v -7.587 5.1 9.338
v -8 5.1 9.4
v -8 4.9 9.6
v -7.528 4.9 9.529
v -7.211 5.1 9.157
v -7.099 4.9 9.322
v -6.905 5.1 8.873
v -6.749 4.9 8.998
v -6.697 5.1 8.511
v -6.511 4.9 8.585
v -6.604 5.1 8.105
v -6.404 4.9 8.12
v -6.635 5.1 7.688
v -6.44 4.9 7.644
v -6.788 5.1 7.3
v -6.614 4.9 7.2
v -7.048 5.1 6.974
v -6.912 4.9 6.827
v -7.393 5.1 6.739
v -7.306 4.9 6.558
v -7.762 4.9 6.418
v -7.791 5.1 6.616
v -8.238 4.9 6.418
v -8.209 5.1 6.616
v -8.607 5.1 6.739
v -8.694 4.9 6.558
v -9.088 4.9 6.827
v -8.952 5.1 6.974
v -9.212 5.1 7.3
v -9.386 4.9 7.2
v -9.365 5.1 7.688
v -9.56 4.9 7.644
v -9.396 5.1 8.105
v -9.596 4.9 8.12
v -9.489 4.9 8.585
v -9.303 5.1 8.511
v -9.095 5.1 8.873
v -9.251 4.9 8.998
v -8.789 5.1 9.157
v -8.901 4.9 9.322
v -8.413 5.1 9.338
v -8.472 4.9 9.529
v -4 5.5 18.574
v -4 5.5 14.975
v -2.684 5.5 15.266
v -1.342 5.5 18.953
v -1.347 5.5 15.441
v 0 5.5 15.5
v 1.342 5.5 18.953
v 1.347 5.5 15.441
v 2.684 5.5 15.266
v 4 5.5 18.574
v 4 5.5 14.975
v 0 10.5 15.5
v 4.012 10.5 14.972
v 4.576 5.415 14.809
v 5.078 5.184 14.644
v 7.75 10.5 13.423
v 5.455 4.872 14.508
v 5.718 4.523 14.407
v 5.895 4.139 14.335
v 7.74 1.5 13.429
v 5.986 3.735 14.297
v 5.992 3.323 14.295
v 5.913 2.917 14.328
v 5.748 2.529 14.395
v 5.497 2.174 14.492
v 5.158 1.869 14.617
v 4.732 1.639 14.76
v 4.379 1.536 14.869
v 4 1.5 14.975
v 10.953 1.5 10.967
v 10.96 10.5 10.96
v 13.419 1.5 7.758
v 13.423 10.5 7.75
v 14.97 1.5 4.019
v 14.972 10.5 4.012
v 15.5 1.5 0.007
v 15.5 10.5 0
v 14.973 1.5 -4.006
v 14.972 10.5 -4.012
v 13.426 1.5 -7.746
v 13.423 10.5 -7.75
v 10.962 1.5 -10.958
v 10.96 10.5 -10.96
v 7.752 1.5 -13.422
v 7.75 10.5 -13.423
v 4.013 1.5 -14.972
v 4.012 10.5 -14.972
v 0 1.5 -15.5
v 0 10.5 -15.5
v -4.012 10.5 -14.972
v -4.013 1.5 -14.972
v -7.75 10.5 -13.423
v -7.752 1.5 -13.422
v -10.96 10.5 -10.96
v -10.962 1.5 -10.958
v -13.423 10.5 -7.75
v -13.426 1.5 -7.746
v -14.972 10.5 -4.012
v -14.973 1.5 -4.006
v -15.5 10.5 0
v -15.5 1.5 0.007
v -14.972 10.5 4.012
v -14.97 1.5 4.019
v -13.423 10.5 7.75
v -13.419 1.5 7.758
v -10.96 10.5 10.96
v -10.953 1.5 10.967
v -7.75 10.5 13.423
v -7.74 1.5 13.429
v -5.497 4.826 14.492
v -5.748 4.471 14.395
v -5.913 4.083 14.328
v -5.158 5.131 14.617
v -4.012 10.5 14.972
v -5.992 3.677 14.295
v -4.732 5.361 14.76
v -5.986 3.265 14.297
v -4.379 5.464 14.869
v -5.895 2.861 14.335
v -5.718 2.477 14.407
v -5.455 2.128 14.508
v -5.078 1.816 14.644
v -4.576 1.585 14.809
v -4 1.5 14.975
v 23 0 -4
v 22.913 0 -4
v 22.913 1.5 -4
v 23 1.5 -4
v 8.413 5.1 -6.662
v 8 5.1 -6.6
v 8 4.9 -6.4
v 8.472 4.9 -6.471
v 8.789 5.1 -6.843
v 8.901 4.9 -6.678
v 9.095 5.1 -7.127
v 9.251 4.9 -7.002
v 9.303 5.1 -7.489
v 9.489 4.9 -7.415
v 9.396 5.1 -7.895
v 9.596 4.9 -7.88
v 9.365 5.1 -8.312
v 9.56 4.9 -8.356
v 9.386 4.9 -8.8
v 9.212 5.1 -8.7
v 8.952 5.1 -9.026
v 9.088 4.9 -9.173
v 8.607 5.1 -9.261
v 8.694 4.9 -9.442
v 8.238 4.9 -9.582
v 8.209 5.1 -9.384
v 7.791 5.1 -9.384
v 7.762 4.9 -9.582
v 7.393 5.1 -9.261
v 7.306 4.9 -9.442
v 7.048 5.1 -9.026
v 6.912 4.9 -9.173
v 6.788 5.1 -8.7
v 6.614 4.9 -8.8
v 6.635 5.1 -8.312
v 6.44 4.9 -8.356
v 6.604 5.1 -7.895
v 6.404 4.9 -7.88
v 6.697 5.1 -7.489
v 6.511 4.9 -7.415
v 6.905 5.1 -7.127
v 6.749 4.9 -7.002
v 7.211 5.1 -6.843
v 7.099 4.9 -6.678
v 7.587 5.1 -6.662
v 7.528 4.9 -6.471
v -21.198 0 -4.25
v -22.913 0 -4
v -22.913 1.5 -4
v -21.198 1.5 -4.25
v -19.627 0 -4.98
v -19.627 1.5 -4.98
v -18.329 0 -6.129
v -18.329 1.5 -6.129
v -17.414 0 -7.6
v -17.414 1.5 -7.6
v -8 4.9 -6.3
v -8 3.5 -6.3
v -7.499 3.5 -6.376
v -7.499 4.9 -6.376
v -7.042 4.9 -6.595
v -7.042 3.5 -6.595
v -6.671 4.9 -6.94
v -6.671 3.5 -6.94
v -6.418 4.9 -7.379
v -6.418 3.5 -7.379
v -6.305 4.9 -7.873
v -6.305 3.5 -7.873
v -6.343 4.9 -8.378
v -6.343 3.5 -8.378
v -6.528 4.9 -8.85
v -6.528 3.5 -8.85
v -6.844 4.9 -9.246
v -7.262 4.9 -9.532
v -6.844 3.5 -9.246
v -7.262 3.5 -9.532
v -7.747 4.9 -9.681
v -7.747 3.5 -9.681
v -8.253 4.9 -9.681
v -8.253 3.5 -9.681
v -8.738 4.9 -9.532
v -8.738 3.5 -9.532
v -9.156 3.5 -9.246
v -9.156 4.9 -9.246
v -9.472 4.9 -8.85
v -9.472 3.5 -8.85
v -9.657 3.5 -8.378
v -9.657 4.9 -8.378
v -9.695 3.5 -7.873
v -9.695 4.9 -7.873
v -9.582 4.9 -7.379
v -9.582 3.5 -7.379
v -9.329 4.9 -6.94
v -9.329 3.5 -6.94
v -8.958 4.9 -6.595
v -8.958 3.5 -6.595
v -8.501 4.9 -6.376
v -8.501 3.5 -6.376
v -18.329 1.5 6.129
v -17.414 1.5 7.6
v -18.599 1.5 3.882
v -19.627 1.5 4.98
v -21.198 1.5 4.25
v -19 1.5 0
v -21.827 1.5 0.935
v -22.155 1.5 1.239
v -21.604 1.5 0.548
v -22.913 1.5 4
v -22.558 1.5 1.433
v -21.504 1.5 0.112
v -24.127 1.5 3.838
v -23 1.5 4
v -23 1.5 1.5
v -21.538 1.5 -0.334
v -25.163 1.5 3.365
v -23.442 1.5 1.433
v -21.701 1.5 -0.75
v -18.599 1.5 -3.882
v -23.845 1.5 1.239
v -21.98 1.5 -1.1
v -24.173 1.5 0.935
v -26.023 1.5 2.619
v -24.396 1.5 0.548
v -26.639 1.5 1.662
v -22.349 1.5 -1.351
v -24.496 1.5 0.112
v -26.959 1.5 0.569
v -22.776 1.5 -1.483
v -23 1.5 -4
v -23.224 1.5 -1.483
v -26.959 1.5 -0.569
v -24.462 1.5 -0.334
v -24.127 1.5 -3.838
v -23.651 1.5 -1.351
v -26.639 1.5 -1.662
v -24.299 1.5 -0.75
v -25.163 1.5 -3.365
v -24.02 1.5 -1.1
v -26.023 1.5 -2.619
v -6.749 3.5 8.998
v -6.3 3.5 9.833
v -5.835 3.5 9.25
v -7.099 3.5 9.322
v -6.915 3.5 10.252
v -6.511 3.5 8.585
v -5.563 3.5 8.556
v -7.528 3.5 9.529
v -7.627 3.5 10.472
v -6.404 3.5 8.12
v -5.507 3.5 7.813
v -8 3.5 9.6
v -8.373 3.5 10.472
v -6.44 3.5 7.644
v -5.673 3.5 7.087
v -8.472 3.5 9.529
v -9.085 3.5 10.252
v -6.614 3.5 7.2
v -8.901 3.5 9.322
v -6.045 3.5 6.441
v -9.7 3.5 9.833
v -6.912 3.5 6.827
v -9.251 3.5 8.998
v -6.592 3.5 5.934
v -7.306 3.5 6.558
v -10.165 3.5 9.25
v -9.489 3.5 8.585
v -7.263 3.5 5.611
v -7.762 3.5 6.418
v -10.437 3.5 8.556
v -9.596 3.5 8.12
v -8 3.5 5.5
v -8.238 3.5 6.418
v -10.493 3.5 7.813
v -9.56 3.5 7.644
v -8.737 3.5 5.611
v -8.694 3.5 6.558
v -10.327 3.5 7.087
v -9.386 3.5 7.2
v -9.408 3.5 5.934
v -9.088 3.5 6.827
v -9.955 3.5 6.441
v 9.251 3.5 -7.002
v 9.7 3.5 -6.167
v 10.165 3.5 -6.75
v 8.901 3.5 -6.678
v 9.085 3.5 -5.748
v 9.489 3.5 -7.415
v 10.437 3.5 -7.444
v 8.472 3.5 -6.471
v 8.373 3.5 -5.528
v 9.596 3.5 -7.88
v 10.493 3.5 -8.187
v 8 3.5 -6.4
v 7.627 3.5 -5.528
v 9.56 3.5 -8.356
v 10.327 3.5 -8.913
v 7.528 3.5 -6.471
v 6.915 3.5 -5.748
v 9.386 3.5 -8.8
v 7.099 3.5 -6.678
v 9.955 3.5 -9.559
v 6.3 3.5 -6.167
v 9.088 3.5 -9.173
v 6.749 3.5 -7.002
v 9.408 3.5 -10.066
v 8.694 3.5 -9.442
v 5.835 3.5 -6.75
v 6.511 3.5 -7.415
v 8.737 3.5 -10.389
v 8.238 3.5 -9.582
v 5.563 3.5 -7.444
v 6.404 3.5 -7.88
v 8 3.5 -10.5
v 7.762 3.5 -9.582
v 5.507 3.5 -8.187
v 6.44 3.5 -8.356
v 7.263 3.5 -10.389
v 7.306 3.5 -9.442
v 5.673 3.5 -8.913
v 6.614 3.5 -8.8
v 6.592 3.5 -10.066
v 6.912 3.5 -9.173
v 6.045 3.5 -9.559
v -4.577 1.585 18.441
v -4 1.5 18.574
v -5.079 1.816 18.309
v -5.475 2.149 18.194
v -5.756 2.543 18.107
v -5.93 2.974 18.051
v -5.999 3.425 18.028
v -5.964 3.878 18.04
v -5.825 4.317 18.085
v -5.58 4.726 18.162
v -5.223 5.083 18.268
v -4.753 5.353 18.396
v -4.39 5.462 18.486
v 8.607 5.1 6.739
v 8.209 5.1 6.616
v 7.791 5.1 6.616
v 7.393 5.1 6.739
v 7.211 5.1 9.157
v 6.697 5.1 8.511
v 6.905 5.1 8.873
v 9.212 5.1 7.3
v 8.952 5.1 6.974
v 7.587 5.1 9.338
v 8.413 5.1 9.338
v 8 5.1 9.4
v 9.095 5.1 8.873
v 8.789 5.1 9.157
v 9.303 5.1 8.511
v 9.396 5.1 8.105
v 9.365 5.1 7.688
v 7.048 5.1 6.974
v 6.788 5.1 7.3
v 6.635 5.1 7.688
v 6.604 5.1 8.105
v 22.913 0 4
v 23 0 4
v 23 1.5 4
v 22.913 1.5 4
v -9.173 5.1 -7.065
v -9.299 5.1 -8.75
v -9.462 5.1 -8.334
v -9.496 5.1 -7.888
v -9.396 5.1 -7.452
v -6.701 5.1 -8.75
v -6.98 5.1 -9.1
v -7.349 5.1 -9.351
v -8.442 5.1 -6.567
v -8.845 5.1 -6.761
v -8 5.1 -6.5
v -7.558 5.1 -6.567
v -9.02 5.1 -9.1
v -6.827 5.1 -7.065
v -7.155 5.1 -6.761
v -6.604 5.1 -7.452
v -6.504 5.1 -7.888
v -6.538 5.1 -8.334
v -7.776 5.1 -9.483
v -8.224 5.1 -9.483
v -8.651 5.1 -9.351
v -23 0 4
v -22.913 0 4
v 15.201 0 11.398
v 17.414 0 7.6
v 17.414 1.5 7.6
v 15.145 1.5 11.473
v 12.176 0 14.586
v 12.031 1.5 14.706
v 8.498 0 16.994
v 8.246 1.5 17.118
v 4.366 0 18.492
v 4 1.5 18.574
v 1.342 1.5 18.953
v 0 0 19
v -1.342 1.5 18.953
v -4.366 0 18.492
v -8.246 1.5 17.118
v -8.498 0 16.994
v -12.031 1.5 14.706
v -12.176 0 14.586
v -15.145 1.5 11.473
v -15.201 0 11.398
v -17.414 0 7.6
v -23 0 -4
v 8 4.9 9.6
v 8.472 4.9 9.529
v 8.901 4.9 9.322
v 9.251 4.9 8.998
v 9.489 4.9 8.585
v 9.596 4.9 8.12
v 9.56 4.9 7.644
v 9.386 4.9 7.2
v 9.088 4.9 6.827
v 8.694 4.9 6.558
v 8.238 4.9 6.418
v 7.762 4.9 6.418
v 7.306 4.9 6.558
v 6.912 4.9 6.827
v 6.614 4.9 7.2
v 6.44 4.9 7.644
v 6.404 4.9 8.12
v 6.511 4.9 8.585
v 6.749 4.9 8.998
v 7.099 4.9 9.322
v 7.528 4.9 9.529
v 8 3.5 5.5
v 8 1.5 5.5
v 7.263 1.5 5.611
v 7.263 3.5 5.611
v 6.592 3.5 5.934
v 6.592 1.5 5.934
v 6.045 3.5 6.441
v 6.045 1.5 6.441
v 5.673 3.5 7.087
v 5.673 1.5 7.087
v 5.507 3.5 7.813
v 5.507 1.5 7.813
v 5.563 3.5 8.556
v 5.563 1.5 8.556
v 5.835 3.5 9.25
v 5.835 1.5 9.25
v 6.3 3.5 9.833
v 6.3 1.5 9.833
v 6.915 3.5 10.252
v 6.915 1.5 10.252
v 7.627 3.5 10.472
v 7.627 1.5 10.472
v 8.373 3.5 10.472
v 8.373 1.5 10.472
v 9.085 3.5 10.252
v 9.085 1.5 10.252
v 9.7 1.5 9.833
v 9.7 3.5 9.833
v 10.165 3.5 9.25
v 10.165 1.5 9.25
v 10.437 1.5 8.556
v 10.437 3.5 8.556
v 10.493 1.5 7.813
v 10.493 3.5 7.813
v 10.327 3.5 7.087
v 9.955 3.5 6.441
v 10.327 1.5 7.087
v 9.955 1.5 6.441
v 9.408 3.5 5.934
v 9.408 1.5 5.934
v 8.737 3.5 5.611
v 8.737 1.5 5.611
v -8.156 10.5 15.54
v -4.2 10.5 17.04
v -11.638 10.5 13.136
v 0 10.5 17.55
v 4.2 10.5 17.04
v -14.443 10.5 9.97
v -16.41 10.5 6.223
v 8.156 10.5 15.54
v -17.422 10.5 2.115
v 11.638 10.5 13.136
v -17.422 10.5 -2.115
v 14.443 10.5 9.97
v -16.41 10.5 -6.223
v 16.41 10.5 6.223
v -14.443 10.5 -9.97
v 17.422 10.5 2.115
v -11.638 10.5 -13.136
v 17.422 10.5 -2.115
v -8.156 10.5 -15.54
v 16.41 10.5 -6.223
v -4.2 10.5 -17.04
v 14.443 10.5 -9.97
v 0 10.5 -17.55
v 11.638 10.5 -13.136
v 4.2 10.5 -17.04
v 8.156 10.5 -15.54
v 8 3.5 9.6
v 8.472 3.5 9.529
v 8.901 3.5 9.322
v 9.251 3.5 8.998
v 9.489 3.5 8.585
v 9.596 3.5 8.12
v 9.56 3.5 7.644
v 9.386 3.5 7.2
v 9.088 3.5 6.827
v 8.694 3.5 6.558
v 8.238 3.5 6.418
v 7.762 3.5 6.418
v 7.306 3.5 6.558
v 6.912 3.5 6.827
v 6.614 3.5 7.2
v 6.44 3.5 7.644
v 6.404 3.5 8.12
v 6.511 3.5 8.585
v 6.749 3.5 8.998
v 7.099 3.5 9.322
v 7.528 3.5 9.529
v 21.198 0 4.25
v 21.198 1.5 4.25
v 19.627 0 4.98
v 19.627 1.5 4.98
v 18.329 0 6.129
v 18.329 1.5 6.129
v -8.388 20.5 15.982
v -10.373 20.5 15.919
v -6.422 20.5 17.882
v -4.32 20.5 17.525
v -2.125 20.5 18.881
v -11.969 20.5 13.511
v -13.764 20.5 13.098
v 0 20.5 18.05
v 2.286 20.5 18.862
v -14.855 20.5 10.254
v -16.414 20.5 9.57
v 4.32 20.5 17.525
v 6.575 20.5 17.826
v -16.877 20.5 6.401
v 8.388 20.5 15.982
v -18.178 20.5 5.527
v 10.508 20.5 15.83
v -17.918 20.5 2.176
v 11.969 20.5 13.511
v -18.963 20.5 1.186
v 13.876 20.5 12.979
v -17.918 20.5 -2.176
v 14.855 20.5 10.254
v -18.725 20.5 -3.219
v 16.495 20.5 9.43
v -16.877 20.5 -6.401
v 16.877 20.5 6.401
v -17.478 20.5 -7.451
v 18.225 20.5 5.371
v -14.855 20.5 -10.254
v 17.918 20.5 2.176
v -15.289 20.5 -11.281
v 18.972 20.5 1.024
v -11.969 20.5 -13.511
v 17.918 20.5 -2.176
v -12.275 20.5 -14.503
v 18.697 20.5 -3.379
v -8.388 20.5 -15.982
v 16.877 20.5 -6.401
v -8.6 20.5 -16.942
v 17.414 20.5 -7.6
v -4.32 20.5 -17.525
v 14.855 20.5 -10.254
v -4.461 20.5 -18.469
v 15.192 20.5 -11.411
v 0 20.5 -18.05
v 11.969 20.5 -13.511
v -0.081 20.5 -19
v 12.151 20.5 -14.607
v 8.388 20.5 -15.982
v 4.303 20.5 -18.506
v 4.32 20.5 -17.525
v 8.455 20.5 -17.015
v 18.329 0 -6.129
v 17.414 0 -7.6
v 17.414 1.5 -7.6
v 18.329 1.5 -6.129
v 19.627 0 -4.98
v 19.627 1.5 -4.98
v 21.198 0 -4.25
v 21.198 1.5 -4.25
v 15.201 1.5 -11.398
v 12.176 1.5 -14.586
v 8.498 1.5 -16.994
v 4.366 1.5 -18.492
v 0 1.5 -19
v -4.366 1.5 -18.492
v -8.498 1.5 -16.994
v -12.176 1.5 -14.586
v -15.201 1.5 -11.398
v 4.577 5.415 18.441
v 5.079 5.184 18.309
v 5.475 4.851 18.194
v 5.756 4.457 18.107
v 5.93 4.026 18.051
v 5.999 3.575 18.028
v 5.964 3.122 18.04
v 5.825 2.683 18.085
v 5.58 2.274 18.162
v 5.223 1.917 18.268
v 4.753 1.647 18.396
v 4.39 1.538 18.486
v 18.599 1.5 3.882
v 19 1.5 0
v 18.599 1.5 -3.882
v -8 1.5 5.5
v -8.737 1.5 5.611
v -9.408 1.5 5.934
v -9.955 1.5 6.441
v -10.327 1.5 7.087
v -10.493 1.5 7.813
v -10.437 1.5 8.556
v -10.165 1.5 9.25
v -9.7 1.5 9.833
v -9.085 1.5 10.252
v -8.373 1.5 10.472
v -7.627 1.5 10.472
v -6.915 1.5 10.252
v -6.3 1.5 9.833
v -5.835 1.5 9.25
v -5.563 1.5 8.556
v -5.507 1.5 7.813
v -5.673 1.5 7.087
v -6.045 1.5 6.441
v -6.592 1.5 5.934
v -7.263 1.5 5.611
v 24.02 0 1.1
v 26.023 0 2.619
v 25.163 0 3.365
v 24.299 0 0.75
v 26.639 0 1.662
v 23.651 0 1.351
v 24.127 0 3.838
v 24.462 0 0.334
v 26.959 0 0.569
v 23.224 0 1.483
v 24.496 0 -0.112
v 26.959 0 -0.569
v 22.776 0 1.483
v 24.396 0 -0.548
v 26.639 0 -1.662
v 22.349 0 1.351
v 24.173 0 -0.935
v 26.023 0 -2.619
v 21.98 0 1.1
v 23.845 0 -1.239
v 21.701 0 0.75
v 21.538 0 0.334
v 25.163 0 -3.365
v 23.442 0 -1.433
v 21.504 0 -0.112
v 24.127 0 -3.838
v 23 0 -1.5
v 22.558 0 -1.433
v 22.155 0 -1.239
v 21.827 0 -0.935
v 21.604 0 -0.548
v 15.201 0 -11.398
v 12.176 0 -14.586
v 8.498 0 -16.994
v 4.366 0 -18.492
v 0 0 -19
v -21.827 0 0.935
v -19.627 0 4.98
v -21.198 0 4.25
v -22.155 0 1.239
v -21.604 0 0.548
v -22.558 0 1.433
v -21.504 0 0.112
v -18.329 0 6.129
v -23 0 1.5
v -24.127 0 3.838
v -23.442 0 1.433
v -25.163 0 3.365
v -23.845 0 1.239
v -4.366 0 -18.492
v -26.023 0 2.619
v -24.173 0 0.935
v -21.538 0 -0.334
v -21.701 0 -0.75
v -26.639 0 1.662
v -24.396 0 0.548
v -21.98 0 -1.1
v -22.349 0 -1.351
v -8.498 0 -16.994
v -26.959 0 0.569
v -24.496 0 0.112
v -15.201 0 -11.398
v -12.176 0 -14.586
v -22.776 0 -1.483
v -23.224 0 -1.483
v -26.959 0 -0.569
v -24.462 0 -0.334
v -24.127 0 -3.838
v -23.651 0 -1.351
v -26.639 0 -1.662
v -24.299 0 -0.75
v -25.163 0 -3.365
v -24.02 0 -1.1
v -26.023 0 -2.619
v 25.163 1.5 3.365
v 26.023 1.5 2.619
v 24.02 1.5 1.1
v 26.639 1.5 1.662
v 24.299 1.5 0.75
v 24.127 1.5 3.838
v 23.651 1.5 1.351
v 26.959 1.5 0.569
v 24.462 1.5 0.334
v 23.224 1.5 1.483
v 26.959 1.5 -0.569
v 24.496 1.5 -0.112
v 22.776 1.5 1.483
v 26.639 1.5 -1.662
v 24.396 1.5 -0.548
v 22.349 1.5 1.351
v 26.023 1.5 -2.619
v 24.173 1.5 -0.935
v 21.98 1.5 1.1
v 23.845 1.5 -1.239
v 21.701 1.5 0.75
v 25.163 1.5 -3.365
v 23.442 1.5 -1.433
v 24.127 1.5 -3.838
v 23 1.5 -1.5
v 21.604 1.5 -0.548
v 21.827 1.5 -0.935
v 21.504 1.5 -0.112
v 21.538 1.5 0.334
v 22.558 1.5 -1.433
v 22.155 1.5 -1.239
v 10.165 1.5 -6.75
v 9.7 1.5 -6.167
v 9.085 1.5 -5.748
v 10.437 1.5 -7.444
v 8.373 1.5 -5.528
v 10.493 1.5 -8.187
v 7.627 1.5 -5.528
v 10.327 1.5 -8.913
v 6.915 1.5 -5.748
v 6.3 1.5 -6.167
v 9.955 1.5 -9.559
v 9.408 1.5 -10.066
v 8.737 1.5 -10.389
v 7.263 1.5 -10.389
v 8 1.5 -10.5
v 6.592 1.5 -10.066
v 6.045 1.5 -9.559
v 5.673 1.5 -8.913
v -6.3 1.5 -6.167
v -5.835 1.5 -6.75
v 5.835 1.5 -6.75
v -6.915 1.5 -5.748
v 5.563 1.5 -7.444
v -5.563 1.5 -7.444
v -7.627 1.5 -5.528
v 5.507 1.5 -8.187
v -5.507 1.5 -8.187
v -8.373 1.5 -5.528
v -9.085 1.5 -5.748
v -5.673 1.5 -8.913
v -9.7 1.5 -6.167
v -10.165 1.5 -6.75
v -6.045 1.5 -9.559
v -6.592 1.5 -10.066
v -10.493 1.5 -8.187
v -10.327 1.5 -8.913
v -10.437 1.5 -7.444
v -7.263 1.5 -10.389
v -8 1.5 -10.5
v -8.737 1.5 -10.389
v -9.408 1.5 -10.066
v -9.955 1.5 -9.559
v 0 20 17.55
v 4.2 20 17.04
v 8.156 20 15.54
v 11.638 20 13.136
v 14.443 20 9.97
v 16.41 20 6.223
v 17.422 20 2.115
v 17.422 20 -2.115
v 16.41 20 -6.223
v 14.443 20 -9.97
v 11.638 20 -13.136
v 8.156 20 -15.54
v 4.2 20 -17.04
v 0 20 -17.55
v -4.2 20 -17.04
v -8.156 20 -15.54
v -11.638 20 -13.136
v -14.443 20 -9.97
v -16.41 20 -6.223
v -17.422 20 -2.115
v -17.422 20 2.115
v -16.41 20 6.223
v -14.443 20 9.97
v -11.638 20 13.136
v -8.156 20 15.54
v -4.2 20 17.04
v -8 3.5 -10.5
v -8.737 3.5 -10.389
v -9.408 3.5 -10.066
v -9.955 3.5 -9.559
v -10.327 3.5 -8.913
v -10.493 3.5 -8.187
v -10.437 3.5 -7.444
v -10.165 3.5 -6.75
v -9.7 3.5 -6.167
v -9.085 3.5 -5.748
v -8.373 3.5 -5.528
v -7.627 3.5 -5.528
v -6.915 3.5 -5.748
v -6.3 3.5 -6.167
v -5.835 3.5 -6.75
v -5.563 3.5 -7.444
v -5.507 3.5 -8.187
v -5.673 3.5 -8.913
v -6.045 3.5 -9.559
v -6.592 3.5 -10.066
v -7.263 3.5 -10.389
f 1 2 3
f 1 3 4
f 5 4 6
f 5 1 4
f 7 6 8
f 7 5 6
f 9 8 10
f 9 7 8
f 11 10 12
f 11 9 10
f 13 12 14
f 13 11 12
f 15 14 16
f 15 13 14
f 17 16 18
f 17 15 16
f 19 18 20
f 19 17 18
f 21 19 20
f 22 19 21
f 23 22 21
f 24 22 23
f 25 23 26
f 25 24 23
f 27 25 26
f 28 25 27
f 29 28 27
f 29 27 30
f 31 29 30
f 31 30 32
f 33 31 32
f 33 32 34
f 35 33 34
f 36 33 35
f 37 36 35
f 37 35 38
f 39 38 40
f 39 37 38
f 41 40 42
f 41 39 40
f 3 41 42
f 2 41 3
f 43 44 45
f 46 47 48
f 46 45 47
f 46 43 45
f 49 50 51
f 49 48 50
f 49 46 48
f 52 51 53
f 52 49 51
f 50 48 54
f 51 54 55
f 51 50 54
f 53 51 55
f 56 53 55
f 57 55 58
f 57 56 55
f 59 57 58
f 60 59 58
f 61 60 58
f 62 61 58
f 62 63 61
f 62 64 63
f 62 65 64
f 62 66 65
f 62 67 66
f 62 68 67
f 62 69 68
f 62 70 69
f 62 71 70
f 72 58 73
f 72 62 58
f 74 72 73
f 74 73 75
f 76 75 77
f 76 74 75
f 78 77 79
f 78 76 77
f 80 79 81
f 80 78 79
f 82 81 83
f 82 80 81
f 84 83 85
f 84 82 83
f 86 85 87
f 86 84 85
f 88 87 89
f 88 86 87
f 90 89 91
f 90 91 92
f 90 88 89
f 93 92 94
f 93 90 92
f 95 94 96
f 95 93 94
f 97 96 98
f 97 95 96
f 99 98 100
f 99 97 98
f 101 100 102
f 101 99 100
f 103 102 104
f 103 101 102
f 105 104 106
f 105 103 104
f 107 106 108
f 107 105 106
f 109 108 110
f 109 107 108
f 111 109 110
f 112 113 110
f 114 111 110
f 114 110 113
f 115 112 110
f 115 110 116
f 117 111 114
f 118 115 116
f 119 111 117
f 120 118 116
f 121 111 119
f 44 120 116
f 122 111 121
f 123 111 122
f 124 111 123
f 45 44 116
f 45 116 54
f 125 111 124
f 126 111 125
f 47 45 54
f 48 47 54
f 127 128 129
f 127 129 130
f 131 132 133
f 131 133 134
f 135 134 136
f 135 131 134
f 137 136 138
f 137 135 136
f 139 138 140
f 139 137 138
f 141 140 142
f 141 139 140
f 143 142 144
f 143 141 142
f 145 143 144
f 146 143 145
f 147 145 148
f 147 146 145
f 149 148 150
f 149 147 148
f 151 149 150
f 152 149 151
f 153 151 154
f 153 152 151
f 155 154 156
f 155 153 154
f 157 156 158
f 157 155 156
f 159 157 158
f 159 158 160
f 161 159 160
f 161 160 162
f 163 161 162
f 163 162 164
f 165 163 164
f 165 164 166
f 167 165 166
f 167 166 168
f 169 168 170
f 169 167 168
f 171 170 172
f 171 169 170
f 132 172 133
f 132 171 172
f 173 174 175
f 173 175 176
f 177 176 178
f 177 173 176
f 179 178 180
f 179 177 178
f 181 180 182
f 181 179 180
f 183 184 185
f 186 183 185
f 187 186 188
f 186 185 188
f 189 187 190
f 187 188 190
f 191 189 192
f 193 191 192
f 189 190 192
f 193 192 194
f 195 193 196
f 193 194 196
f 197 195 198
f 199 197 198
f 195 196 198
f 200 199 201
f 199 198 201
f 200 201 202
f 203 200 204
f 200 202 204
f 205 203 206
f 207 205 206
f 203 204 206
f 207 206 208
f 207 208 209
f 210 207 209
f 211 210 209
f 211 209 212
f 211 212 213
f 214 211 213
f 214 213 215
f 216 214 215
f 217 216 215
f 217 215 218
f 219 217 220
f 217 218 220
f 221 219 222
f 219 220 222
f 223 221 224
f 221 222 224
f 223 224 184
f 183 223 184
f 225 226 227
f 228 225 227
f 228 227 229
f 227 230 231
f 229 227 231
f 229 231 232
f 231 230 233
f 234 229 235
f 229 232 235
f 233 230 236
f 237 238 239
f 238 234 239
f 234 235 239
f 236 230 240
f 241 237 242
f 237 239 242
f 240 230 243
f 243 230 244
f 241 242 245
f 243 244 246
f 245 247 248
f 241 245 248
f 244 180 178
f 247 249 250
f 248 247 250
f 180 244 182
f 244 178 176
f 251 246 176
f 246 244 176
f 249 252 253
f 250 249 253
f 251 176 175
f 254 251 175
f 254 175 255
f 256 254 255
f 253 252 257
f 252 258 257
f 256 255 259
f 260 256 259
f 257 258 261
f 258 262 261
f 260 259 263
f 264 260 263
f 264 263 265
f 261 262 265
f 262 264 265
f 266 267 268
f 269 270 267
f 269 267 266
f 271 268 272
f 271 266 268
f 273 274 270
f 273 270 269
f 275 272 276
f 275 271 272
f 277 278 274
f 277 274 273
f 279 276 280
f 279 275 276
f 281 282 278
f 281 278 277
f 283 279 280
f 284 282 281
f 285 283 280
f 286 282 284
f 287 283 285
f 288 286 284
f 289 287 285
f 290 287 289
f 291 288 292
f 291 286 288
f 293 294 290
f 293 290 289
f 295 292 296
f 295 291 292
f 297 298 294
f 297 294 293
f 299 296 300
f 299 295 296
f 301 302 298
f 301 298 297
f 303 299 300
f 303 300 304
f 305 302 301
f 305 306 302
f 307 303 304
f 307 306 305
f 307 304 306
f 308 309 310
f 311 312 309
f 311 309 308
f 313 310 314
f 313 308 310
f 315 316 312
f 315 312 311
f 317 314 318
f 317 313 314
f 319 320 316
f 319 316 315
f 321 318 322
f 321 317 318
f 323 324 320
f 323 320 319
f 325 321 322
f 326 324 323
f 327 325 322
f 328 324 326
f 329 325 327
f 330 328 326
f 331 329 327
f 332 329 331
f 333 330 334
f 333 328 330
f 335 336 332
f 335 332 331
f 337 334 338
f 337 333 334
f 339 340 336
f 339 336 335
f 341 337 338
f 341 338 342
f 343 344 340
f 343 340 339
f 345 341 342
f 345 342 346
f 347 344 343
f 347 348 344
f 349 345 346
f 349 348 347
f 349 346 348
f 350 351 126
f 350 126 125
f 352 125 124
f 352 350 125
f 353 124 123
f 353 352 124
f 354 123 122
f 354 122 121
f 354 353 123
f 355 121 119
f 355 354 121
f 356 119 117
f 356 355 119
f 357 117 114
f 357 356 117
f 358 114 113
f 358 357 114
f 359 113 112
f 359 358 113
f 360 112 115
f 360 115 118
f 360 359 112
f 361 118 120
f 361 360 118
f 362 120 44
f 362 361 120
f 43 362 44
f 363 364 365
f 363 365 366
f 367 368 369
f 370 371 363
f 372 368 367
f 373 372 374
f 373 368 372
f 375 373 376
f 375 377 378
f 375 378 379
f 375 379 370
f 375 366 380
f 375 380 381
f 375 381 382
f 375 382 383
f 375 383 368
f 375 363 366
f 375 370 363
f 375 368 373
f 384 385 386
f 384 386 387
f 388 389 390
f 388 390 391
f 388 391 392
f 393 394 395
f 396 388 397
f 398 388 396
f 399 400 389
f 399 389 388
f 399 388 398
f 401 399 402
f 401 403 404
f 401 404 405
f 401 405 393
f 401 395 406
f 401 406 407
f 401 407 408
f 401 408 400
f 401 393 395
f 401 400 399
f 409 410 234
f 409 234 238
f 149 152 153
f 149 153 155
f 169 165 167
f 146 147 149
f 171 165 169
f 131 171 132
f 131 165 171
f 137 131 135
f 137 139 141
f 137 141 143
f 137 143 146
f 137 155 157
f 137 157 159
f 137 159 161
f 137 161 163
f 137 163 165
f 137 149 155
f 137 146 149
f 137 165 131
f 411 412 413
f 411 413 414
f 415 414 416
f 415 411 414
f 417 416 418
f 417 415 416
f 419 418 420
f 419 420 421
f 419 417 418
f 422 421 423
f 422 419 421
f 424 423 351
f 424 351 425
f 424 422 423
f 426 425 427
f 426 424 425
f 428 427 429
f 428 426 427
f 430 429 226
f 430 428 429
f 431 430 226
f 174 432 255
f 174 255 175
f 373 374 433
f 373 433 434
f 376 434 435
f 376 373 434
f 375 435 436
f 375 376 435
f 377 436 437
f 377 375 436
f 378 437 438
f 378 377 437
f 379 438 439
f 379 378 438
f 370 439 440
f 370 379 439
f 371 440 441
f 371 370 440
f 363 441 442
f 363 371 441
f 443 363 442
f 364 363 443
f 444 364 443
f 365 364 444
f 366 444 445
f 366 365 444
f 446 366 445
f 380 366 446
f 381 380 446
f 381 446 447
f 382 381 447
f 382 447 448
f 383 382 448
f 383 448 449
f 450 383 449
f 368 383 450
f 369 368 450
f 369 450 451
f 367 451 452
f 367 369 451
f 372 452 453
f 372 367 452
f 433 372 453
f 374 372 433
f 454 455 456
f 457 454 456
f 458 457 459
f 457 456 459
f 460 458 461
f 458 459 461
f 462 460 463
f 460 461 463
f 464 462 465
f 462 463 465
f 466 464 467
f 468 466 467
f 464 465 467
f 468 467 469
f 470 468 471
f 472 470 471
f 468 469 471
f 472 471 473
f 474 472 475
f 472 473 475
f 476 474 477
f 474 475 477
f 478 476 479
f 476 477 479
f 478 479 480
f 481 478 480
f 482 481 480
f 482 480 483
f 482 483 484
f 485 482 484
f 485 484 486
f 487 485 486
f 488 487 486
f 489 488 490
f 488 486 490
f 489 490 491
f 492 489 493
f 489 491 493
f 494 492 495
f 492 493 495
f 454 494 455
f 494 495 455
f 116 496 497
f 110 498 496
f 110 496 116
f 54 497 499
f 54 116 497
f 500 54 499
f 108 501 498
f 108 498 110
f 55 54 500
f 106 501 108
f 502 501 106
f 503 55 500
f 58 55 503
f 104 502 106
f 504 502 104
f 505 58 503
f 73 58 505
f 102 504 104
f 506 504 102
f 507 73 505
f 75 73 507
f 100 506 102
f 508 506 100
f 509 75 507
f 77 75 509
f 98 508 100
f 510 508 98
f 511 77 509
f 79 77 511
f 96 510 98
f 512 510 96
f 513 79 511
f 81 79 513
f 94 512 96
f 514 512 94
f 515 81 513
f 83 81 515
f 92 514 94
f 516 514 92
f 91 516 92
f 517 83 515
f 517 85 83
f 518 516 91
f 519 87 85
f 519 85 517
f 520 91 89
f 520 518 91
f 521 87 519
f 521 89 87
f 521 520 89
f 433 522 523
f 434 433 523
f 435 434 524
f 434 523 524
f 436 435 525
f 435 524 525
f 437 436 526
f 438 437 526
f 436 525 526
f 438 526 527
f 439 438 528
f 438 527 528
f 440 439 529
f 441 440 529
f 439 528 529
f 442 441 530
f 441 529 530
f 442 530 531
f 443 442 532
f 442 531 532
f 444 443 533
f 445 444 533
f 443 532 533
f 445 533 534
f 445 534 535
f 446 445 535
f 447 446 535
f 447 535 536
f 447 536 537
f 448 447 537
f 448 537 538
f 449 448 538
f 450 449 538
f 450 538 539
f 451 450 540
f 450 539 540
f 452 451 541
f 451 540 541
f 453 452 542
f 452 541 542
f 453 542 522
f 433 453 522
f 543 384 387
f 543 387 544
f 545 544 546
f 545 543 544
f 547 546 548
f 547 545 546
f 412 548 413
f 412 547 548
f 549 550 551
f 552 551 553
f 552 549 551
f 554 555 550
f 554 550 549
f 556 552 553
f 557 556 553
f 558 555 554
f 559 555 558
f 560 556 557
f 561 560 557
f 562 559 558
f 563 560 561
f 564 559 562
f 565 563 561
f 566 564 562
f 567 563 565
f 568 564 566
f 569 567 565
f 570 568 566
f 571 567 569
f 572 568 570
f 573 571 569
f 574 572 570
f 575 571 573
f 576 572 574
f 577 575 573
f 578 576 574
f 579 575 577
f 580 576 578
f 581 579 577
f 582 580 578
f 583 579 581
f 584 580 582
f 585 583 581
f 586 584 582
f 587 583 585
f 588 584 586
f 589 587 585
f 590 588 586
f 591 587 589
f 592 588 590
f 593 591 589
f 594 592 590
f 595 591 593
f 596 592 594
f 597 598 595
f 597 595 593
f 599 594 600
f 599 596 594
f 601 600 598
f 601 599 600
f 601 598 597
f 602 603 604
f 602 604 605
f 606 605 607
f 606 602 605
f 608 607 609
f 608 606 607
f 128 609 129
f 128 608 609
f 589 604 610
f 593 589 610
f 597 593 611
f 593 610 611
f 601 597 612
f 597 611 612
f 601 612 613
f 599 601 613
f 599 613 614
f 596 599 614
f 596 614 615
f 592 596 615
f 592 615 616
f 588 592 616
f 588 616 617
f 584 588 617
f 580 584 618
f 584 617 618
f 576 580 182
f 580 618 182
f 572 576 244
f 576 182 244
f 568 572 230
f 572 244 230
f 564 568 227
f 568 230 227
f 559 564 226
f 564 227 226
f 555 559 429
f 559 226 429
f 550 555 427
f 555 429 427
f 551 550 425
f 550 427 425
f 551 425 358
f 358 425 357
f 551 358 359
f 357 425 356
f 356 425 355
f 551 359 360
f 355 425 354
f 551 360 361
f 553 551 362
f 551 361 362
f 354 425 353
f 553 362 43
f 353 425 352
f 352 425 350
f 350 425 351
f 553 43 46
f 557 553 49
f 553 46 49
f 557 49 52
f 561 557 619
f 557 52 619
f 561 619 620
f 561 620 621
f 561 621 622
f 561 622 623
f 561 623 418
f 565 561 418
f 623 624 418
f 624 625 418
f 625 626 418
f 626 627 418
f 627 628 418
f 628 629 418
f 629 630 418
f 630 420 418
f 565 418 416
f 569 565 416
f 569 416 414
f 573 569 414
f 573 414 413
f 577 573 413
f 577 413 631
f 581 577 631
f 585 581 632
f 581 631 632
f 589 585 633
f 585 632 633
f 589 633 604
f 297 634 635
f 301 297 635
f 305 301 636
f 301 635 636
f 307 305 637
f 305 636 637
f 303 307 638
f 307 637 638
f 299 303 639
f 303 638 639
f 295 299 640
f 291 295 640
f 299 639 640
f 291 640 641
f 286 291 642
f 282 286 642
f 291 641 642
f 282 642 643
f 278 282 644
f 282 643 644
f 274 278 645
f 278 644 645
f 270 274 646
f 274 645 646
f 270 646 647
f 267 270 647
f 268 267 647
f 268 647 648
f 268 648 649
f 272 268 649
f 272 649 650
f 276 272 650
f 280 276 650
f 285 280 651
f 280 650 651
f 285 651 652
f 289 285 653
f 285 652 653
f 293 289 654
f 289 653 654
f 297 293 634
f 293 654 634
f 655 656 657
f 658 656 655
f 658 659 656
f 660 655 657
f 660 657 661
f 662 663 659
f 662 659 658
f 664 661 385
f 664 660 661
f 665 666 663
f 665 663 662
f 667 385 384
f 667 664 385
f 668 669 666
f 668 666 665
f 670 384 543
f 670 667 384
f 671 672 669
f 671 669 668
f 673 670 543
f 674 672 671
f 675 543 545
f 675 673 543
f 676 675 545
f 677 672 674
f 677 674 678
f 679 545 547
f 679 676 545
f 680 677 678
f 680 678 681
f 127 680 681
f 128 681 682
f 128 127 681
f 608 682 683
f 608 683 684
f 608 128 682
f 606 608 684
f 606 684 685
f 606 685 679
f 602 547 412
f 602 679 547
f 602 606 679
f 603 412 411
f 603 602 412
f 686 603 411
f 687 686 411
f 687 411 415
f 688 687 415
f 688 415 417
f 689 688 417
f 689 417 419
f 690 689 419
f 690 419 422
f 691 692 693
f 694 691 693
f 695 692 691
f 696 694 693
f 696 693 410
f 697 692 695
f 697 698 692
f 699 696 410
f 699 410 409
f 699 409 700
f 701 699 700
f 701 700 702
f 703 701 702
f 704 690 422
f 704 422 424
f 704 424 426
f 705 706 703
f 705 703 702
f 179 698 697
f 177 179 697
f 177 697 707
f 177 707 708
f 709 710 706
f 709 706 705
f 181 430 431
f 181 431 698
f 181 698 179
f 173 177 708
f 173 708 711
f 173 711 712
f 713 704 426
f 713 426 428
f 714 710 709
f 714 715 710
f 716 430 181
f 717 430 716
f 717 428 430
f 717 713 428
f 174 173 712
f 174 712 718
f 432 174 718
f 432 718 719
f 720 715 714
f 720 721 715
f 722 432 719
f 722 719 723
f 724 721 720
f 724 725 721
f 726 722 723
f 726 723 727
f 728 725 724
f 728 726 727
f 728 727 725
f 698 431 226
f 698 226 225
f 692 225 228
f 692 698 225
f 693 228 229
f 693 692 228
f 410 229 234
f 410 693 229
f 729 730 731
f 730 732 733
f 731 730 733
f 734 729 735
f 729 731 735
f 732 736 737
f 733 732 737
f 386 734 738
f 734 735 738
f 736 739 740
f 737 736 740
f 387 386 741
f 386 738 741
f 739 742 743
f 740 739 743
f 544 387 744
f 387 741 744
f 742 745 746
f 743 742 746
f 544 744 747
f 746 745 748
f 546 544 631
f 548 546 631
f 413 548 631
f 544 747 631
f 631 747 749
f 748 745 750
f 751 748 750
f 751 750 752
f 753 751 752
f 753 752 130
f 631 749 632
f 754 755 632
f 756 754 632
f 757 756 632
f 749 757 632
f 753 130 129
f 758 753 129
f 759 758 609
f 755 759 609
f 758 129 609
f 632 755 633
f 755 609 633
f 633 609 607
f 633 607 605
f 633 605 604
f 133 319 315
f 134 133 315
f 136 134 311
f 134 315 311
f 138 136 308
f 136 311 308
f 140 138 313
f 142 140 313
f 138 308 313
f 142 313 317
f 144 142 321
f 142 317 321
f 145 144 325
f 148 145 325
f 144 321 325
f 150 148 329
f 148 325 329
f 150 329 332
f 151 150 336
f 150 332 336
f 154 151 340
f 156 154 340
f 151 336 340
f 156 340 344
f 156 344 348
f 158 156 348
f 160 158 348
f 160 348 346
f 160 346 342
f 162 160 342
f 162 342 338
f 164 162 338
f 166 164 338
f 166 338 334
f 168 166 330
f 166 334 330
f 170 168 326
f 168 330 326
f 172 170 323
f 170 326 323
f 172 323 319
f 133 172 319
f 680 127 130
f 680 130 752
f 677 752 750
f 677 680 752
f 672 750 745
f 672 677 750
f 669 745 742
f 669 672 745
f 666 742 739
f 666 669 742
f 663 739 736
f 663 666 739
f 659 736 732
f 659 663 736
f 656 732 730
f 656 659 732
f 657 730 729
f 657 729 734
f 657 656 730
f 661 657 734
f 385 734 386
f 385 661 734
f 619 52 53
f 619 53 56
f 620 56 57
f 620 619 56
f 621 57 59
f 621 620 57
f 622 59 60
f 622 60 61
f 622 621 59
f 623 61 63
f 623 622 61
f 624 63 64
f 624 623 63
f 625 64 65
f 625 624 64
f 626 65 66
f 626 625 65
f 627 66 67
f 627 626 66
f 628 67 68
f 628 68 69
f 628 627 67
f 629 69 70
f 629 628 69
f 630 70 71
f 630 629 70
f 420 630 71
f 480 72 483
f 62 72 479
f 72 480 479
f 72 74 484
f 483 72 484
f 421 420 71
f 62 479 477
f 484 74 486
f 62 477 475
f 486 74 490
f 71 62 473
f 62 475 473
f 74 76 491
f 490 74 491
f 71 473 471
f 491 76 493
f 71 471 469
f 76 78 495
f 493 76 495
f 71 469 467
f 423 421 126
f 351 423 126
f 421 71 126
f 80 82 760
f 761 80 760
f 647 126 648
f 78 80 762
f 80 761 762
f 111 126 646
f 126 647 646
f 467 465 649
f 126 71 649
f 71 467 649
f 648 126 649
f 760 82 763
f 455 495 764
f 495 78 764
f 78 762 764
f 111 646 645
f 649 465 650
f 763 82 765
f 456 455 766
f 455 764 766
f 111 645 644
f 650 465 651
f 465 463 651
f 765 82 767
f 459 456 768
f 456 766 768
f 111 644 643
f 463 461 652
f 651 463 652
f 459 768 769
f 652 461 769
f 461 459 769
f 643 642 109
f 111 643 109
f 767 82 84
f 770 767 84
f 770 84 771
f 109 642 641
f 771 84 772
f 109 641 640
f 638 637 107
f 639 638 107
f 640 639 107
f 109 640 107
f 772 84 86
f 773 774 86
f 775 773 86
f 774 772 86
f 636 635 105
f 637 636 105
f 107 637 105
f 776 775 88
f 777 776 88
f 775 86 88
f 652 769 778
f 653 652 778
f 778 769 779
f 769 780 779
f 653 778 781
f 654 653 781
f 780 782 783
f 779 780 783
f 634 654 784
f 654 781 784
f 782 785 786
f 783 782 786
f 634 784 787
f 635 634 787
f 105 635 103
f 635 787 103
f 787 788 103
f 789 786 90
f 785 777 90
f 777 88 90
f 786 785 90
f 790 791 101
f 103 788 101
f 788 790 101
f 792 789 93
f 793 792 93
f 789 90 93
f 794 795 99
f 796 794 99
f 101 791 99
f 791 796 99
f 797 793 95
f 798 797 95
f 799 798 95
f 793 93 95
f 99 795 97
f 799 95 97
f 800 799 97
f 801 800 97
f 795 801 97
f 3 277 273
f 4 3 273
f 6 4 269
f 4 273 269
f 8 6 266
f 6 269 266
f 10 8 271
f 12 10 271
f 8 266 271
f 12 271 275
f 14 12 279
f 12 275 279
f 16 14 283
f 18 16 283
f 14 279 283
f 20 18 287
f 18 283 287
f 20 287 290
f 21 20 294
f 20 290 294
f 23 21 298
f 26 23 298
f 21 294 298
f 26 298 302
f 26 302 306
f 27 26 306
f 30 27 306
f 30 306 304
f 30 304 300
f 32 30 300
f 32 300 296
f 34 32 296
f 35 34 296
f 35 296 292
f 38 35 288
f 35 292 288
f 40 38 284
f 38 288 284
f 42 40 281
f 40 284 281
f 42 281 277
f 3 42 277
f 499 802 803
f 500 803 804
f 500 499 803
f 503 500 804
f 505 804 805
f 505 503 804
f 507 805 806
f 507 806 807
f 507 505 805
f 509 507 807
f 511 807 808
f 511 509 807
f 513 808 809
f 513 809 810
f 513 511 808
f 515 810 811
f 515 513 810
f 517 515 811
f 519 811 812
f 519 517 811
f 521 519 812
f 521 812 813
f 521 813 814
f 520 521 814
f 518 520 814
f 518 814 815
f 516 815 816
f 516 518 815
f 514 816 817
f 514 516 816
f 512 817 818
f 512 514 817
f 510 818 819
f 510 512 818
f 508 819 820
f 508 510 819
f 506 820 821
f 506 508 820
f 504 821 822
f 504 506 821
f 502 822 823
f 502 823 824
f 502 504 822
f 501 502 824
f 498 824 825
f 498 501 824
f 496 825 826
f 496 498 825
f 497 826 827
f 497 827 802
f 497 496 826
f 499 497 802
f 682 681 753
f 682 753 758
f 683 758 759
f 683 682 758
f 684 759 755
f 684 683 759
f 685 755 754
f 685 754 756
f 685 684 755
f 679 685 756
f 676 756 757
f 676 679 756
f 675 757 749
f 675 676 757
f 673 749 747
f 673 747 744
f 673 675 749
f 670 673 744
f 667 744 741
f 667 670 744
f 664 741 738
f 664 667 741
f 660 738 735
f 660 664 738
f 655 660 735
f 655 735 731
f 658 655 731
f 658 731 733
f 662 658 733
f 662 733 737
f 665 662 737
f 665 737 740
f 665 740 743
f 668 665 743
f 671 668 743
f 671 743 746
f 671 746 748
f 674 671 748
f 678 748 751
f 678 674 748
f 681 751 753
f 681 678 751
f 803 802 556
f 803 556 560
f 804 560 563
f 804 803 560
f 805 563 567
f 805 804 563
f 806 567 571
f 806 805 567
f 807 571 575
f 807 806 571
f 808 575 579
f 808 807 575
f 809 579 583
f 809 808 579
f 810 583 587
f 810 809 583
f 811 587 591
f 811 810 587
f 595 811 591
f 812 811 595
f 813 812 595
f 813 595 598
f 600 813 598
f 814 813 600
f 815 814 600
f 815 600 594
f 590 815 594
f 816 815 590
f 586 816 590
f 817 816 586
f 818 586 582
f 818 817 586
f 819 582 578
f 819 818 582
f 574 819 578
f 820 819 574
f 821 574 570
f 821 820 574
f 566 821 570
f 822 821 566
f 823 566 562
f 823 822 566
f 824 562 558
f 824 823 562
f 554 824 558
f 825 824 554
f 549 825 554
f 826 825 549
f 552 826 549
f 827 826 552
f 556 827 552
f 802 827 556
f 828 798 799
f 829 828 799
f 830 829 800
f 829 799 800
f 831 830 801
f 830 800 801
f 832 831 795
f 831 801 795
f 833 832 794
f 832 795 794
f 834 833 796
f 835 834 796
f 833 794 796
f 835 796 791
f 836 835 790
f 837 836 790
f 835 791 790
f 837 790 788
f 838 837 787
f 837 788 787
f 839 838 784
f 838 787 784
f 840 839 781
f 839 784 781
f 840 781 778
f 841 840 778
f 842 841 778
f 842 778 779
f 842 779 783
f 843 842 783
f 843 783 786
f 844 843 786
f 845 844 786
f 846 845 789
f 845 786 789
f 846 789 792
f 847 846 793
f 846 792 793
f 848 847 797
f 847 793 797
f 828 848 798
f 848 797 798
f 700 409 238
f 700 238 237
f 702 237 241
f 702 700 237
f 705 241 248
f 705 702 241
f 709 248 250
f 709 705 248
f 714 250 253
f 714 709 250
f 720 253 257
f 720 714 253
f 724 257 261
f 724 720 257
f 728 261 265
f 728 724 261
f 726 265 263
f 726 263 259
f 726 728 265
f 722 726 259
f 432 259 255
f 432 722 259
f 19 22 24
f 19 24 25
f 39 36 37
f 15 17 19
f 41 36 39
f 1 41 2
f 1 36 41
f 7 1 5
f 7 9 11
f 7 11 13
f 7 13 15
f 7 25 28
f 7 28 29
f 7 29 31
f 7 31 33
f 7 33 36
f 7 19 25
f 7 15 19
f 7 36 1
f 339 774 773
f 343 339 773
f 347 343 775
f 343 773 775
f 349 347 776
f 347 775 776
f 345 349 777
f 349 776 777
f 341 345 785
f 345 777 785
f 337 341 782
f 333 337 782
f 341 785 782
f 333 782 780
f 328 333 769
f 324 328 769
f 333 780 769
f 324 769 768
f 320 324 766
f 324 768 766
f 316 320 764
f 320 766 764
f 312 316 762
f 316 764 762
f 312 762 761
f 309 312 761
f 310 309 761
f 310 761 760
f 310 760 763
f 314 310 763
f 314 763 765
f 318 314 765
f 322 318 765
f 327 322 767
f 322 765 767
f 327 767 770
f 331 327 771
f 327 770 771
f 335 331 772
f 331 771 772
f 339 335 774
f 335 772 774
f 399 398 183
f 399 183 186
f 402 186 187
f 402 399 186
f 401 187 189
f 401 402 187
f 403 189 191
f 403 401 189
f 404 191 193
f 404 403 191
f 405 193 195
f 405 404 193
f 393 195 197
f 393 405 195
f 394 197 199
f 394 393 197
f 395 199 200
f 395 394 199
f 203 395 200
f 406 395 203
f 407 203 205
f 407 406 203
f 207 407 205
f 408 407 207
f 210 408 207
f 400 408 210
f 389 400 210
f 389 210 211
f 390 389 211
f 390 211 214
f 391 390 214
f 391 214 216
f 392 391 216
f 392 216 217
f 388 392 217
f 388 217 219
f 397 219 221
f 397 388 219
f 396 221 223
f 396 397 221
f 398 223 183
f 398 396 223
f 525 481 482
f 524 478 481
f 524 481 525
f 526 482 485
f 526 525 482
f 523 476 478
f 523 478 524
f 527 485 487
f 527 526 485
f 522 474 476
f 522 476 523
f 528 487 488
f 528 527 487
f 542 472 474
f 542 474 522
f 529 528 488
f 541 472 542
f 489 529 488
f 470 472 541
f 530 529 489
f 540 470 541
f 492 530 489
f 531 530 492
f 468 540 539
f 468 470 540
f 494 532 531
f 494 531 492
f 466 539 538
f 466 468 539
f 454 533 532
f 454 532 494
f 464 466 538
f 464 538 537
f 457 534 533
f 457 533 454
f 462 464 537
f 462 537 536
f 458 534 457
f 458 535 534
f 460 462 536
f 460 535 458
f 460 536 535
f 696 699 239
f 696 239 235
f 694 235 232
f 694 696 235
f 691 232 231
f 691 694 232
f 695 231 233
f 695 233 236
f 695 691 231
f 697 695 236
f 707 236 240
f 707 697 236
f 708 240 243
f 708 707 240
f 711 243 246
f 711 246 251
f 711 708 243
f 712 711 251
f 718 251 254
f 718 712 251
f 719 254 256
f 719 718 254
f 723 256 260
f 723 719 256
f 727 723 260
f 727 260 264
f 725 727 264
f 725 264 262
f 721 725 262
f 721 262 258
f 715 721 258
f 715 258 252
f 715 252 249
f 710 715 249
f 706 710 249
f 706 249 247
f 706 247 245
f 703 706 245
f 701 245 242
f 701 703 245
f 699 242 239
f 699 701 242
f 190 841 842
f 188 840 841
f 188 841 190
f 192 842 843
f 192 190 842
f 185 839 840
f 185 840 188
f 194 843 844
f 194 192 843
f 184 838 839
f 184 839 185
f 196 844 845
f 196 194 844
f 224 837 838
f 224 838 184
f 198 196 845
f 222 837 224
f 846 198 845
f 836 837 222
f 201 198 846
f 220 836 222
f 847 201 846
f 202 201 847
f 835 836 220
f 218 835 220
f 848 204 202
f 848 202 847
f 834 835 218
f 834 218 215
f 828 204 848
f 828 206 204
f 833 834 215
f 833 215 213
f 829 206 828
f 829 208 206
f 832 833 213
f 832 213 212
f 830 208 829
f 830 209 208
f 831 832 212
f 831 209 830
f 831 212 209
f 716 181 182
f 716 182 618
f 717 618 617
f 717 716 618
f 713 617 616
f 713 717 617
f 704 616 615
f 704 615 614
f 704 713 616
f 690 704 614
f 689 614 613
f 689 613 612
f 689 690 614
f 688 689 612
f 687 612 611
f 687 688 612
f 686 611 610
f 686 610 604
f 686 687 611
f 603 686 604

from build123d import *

# Parameters (mm, degrees)
SKETCH_2_R               = 1.5
EXTRUDE_2_DEPTH          = 1.5
SKETCH_3_R               = 19
SKETCH_3_R_2             = 15.5
EXTRUDE_3_DEPTH          = 9
SKETCH_4_R               = 2.5
EXTRUDE_4_DEPTH          = 2
SKETCH_8_R               = 19
SKETCH_8_R_2             = 17.55
EXTRUDE_5_DEPTH          = 10
SKETCH_9_R               = 1.7
SKETCH_9_R_2             = 1.6
EXTRUDE_6_DEPTH          = 1.6
CUT_EXTRUDE_2_REACH      = 53.674
CUT_EXTRUDE_2_END_RADIUS = 15.5
CHAMFER_1_SIZE           = 0.5
CHAMFER_2_SIZE           = 0.2


with BuildPart() as part:
    # Эскиз2 → Бобышка-Вытянуть2 (new body)
    with BuildSketch(Plane(origin=(0, 0, 0), x_dir=(1, 0, 0), z_dir=(0, 1, 0))):
        with BuildLine():
            Line((-23, 4), (-22.912878475, 4))
            ThreePointArc((-22.912878475, 4), (-19.62654313, 4.980039841), (-17.413787641, 7.6))
            ThreePointArc((-17.413787641, 7.6), (0, 19), (17.413787641, 7.6))
            ThreePointArc((17.413787641, 7.6), (19.62654313, 4.980039841), (22.912878475, 4))
            Line((22.912878475, 4), (23, 4))
            ThreePointArc((23, 4), (27, 0), (23, -4))
            Line((23, -4), (22.912878475, -4))
            ThreePointArc((22.912878475, -4), (19.62654313, -4.980039841), (17.413787641, -7.6))
            ThreePointArc((17.413787641, -7.6), (0, -19), (-17.413787641, -7.6))
            ThreePointArc((-17.413787641, -7.6), (-19.62654313, -4.980039841), (-22.912878475, -4))
            Line((-22.912878475, -4), (-23, -4))
            ThreePointArc((-23, -4), (-27, 0), (-23, 4))
        make_face()
        with Locations(Location((-23, 0, 0), (0, 0, 270))):
            Circle(SKETCH_2_R, mode=Mode.SUBTRACT)
        with Locations(Location((23, 0, 0), (0, 0, 90))):
            Circle(SKETCH_2_R, mode=Mode.SUBTRACT)
    extrude(amount=EXTRUDE_2_DEPTH)

    # Эскиз3 → Бобышка-Вытянуть3 (add)
    with BuildSketch(Plane(origin=(0, 1.5, 0), x_dir=(1, 0, 0), z_dir=(0, 1, 0))):
        with Locations(Location((0, 0, 0), (0, 0, 23.578178478))):
            Circle(SKETCH_3_R)
        with Locations(Location((0, 0, 0), (0, 0, 270))):
            Circle(SKETCH_3_R_2, mode=Mode.SUBTRACT)
    extrude(amount=EXTRUDE_3_DEPTH)

    # Эскиз4 → Бобышка-Вытянуть4 (add)
    with BuildSketch(Plane(origin=(0, 1.5, 0), x_dir=(1, 0, 0), z_dir=(0, 1, 0))):
        with Locations(Location((-8, -8, 0), (0, 0, 90))):
            Circle(SKETCH_4_R)
        with Locations(Location((8, -8, 0), (0, 0, 90))):
            Circle(SKETCH_4_R)
        with Locations(Location((8, 8, 0), (0, 0, 90))):
            Circle(SKETCH_4_R)
        with Locations(Location((-8, 8, 0), (0, 0, 90))):
            Circle(SKETCH_4_R)
    extrude(amount=EXTRUDE_4_DEPTH)

    # Эскиз8 → Бобышка-Вытянуть5 (add)
    with BuildSketch(Plane(origin=(0, 10.5, 0), x_dir=(1, 0, 0), z_dir=(0, 1, 0))):
        with Locations(Location((0, 0, 0), (0, 0, 23.578178478))):
            Circle(SKETCH_8_R)
        with Locations(Location((0, 0, 0), (0, 0, 270))):
            Circle(SKETCH_8_R_2, mode=Mode.SUBTRACT)
    extrude(amount=EXTRUDE_5_DEPTH)

    # Эскиз9 → Бобышка-Вытянуть6 (add)
    with BuildSketch(Plane(origin=(0, 3.5, 0), x_dir=(1, 0, 0), z_dir=(0, 1, 0))):
        with Locations(Location((-8, 8, 0), (0, 0, 270))):
            Circle(SKETCH_9_R)
        with Locations(Location((8, 8, 0), (0, 0, 270))):
            Circle(SKETCH_9_R_2)
        with Locations(Location((-8, -8, 0), (0, 0, 270))):
            Circle(SKETCH_9_R_2)
        with Locations(Location((8, -8, 0), (0, 0, 270))):
            Circle(SKETCH_9_R_2)
    extrude(amount=EXTRUDE_6_DEPTH)

    # Вырез-Вытянуть2: up to this cylinder (the profile starts outside it)
    cut_extrude_2_end = Plane(origin=(0, 3.5, 0), z_dir=(0, -1, 0)) * Cylinder(CUT_EXTRUDE_2_END_RADIUS, 139.348, mode=Mode.PRIVATE)
    # Эскиз11 → Вырез-Вытянуть2 (cut, up to the surface)
    with BuildSketch(Plane.XY.offset(20), mode=Mode.PRIVATE) as cut_extrude_2_sk1:
        with BuildLine():
            Line((-4, 5.5), (4, 5.5))
            ThreePointArc((4, 5.5), (6, 3.5), (4, 1.5))
            Line((4, 1.5), (-4, 1.5))
            ThreePointArc((-4, 1.5), (-6, 3.5), (-4, 5.5))
        make_face()
    cut_extrude_2_tool1 = extrude(cut_extrude_2_sk1.sketch, amount=-CUT_EXTRUDE_2_REACH, mode=Mode.PRIVATE) - cut_extrude_2_end
    add(cut_extrude_2_tool1.solids().sort_by_distance((0, 3.5, 20))[0], mode=Mode.SUBTRACT)

    # Фаска1
    chamfer_1_edges = [part.edges().sort_by_distance(p)[0] for p in [
        (0, 20.5, -17.55),
    ]]
    chamfer(chamfer_1_edges, length=CHAMFER_1_SIZE)

    # Фаска2
    chamfer_2_edges = [part.edges().sort_by_distance(p)[0] for p in [
        (-8, 5.1, -9.7),
        (8, 5.1, -9.6),
        (-8, 5.1, 6.4),
        (8, 5.1, 6.4),
    ]]
    chamfer(chamfer_2_edges, length=CHAMFER_2_SIZE)


solid = part.part
